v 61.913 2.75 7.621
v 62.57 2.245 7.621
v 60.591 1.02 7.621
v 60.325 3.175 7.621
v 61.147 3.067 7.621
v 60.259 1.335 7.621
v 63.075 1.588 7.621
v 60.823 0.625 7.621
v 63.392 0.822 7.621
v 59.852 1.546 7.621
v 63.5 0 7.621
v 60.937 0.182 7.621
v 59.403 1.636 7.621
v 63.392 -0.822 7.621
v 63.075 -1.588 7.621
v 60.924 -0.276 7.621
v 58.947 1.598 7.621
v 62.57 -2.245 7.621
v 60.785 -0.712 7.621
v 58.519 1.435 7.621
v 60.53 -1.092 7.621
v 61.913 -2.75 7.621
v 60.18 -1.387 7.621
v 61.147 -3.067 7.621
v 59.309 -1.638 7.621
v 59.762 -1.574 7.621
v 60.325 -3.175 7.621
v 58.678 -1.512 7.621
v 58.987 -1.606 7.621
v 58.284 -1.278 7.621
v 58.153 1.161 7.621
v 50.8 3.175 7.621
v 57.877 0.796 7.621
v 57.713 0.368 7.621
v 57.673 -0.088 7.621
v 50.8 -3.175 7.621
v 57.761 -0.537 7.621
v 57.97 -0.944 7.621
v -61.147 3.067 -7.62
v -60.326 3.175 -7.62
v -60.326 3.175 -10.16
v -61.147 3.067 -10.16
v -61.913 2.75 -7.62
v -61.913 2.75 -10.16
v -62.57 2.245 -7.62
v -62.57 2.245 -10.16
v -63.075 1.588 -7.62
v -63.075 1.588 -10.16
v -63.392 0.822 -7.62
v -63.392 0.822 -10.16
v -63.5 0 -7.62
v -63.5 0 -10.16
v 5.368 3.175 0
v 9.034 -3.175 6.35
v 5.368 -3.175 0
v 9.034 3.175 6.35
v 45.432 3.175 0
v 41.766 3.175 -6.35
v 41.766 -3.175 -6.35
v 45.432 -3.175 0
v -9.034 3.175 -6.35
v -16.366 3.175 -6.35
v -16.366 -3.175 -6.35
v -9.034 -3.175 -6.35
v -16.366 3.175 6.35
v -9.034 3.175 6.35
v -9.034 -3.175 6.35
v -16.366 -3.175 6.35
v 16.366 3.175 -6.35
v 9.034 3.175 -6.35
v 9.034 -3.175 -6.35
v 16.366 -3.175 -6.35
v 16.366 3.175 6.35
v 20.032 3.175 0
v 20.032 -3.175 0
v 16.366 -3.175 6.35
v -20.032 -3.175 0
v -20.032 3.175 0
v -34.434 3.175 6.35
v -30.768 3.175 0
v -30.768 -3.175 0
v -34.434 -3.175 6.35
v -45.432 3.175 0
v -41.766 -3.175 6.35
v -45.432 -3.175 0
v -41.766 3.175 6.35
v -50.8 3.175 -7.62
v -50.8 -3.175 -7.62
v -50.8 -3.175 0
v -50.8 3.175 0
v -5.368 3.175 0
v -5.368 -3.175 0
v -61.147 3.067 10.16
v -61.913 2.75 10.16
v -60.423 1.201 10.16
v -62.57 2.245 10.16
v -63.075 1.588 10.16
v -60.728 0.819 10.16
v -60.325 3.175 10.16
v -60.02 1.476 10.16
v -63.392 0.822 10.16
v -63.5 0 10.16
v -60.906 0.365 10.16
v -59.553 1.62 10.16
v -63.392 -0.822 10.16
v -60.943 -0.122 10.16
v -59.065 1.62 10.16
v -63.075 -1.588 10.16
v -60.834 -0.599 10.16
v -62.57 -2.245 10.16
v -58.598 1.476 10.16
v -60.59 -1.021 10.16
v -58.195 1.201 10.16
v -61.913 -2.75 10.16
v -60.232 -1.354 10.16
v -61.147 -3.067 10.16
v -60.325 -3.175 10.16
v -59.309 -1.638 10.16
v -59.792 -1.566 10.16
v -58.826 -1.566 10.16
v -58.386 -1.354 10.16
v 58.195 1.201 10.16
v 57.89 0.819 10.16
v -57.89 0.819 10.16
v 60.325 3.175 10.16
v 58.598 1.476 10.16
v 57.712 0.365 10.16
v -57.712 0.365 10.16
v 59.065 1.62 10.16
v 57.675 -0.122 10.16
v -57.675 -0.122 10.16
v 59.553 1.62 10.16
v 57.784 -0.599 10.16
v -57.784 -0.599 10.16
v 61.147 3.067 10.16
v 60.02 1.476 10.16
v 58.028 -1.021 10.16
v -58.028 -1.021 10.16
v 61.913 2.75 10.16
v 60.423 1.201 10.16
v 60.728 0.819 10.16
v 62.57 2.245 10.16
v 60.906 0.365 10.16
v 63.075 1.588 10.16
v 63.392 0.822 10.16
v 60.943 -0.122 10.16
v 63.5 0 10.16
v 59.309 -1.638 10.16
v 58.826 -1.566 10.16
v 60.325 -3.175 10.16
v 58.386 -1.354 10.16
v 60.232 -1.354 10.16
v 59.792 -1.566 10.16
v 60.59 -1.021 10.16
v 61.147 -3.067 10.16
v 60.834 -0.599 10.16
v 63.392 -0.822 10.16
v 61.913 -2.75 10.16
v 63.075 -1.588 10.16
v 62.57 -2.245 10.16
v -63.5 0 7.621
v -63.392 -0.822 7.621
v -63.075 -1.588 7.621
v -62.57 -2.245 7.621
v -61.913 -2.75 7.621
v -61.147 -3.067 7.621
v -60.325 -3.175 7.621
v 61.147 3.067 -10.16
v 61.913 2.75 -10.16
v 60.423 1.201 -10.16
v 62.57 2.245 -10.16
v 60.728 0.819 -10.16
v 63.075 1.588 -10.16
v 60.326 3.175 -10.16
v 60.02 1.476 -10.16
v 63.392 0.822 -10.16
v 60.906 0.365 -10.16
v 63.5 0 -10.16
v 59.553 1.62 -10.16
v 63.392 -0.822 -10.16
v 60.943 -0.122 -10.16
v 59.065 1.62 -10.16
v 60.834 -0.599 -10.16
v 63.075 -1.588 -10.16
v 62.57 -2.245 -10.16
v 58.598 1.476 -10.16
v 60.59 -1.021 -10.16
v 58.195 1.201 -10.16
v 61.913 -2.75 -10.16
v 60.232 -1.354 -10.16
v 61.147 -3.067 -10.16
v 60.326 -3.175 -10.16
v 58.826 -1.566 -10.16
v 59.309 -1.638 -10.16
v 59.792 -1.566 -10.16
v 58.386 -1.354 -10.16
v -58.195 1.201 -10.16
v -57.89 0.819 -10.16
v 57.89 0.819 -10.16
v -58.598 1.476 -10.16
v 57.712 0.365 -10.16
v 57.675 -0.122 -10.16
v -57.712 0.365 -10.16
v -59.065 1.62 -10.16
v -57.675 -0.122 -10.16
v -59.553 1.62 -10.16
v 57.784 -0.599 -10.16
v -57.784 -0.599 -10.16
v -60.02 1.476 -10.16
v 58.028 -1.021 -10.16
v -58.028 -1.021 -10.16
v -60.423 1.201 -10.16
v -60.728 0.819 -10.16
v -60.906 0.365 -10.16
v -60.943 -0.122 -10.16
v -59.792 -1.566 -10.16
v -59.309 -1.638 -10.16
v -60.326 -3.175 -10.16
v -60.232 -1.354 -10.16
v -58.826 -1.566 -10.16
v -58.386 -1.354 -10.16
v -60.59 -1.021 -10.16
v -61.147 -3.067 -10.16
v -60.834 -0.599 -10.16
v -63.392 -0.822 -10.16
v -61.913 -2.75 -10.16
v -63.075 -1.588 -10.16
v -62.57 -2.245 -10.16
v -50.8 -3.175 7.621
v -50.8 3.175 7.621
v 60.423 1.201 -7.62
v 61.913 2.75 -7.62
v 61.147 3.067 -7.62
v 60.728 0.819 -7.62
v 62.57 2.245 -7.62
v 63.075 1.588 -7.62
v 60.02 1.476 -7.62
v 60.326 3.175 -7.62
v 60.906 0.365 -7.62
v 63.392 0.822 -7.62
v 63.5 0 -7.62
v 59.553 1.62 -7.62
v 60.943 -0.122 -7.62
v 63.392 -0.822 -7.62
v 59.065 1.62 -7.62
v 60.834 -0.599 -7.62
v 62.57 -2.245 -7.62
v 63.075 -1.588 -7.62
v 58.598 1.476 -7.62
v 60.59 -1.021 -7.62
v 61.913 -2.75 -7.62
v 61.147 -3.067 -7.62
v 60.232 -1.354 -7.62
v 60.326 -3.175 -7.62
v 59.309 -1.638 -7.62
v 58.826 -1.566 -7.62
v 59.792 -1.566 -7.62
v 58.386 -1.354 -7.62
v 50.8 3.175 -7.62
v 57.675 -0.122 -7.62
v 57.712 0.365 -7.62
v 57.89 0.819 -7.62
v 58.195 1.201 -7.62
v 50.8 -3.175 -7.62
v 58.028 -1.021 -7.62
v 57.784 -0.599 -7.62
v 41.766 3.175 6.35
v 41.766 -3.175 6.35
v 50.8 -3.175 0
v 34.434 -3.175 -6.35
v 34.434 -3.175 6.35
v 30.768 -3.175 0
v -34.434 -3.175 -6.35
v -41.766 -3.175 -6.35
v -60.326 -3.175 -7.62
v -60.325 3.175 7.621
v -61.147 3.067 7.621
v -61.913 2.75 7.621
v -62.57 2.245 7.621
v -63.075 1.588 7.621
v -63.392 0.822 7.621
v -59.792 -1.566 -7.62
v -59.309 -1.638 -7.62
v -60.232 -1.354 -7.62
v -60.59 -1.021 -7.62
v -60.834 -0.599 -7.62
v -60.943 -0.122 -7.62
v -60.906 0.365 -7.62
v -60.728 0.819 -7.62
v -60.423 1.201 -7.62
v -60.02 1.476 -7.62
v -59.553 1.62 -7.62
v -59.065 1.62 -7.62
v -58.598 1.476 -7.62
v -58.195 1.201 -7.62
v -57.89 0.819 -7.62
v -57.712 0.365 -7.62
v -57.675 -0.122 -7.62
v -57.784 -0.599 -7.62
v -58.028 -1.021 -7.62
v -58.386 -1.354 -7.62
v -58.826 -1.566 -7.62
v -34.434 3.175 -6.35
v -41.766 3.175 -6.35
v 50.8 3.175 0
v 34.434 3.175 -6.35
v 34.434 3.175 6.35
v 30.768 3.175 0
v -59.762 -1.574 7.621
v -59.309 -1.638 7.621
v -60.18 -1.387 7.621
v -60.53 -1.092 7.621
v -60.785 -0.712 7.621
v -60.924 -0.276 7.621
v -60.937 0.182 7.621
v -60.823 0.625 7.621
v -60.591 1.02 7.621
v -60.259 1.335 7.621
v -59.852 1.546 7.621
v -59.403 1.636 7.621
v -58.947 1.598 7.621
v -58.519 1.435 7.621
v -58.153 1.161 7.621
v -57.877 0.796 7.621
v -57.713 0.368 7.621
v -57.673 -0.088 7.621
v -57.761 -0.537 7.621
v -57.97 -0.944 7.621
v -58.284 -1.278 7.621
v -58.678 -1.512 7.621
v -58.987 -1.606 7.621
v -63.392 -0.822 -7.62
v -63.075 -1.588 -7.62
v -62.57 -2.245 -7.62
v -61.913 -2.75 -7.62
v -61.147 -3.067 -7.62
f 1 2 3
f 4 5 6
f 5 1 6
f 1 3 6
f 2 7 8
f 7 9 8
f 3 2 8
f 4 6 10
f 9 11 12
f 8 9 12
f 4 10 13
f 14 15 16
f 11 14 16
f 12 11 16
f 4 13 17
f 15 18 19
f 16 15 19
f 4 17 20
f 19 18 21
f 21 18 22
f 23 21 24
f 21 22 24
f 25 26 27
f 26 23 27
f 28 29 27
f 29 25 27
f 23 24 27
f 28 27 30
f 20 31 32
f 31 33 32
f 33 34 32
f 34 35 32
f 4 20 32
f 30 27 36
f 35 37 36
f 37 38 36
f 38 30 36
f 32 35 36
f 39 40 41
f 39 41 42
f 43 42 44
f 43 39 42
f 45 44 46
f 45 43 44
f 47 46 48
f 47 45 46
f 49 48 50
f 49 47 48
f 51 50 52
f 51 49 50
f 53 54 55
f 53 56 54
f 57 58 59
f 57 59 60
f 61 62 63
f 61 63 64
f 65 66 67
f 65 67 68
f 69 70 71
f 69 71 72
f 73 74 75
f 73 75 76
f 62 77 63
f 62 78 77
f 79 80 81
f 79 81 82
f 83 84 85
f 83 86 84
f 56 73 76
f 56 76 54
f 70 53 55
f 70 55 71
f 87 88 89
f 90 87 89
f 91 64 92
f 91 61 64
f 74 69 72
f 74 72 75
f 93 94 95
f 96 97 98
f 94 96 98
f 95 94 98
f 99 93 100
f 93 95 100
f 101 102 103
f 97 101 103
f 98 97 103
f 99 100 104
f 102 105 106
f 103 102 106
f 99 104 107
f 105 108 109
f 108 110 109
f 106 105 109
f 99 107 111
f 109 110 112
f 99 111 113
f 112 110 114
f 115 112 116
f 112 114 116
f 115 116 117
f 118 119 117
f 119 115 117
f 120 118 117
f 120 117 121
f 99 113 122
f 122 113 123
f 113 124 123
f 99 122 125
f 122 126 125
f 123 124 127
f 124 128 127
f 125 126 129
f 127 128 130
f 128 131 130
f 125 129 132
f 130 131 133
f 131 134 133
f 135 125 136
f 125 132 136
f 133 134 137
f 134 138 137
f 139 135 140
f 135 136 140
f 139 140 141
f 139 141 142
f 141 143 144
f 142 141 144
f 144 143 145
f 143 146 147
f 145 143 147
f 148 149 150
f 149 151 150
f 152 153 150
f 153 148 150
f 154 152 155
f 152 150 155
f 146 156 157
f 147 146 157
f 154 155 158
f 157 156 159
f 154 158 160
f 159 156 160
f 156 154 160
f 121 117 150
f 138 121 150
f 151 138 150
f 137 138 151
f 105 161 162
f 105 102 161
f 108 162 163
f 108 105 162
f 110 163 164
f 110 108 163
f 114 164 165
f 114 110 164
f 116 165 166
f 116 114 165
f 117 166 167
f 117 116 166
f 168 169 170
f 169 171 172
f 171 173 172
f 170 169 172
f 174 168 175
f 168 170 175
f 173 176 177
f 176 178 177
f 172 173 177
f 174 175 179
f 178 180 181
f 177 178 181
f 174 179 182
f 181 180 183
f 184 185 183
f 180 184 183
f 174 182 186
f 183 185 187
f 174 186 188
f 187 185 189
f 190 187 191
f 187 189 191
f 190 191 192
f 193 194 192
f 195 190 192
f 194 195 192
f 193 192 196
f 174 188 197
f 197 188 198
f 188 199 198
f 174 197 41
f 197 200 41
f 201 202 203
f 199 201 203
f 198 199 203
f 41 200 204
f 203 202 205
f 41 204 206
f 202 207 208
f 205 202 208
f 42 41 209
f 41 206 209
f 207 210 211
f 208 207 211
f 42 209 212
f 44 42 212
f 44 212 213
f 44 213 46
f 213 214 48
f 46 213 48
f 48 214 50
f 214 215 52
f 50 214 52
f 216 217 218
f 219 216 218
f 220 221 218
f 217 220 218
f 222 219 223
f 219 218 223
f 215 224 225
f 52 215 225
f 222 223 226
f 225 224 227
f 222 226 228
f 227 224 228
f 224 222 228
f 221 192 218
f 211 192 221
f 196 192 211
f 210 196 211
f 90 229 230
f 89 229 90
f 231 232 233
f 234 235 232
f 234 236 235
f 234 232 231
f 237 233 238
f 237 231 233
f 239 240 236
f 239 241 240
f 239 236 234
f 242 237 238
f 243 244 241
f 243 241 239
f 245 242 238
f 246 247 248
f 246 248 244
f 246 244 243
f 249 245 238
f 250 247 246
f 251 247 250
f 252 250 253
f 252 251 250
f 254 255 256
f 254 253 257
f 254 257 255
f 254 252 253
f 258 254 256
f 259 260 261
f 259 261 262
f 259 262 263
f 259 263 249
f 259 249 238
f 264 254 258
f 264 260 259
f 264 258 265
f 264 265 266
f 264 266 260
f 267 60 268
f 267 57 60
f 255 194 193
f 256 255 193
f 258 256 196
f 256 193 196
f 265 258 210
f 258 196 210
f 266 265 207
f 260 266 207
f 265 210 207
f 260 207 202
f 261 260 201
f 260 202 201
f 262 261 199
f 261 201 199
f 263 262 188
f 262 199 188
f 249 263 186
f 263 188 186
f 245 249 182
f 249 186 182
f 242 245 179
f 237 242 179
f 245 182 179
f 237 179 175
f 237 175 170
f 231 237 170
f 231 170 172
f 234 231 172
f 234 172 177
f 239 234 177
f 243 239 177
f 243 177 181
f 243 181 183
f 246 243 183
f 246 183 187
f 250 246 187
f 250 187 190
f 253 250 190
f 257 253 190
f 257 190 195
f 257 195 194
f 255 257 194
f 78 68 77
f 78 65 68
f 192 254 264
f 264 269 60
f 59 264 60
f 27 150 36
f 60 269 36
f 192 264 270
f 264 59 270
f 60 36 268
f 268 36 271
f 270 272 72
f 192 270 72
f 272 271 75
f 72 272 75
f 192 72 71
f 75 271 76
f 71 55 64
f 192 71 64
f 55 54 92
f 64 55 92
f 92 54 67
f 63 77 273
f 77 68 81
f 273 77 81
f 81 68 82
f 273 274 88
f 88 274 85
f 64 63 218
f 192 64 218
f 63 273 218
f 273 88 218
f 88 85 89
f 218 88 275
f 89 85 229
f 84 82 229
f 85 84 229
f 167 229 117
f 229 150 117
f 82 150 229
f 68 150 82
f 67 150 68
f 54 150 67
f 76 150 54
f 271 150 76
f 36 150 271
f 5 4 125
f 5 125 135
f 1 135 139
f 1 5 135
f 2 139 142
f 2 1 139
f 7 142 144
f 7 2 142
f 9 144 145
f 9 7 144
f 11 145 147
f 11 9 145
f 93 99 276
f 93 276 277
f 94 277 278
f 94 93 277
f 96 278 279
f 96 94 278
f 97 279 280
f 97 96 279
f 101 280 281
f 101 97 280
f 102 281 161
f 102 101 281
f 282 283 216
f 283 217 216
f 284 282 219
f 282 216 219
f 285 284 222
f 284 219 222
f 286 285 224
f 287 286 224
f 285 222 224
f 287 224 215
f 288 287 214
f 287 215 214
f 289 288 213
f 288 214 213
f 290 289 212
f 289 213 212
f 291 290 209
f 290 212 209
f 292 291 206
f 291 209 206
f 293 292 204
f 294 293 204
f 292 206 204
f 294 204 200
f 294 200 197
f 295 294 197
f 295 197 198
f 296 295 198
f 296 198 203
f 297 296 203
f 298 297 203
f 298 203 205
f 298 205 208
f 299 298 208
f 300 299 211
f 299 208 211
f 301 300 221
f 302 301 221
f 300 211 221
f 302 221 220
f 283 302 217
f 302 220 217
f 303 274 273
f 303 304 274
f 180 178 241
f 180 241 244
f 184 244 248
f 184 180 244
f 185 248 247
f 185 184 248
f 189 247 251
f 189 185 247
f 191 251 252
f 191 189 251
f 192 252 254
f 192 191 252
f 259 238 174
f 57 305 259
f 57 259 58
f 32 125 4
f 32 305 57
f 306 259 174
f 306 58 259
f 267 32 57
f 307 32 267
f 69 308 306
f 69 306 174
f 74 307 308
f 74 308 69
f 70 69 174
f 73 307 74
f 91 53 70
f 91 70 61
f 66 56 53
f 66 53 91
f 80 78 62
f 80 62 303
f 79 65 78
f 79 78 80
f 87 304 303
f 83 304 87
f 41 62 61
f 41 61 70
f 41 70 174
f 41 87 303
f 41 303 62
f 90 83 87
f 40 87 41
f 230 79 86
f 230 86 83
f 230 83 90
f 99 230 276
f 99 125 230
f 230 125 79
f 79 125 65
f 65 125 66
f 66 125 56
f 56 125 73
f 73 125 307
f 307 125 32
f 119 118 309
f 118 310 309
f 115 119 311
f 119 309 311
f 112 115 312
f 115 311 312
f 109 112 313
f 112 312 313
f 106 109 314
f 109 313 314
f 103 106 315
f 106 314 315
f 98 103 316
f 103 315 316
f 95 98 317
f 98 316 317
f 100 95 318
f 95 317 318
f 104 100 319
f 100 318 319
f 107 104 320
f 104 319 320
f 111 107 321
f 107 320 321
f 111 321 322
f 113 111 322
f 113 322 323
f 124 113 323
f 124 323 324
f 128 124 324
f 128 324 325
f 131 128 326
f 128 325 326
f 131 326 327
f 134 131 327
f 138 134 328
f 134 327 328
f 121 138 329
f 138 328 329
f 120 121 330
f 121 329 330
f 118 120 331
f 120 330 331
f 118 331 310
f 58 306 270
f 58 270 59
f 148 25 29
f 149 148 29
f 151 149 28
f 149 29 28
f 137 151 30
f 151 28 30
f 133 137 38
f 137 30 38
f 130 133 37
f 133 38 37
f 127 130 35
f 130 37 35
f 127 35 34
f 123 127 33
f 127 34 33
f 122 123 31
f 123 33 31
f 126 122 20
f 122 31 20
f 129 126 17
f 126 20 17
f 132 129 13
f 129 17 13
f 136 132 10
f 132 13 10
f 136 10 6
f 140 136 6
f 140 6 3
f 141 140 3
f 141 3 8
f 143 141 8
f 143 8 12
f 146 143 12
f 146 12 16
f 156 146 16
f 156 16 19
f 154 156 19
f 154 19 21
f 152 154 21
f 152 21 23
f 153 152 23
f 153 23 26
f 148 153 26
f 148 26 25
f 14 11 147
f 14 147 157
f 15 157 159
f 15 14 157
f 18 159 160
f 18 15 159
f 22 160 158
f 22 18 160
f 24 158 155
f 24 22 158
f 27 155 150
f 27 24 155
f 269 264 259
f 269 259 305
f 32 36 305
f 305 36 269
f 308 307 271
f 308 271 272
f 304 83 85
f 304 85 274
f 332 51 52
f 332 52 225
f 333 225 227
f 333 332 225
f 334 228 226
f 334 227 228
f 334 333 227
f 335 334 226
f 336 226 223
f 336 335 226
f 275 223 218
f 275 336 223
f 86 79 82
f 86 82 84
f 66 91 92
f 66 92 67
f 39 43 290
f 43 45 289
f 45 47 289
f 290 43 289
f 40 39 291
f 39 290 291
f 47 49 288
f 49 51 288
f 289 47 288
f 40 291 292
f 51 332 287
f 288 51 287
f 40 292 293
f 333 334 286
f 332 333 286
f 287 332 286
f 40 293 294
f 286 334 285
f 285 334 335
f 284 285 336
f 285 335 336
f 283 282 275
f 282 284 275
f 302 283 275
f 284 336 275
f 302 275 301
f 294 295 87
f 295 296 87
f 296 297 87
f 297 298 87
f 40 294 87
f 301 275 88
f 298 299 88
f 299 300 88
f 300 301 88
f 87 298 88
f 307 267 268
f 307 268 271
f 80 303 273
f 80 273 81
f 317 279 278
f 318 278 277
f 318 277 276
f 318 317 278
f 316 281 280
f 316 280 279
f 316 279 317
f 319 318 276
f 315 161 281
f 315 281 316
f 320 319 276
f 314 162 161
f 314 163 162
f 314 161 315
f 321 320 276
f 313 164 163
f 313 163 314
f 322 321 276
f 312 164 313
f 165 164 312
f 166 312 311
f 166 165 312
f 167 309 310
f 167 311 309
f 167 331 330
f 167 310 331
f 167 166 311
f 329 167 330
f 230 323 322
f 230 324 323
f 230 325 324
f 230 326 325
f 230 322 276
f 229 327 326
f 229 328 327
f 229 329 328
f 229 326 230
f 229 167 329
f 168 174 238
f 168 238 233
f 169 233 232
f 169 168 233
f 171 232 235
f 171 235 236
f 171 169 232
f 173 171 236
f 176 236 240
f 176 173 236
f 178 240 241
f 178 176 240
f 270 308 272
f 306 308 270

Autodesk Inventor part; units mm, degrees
ref_plane "YZ Plane" through (0, 0, 0) normal (1, 0, 0) x (0, 1, 0)
ref_plane "XZ Plane" through (0, 0, 0) normal (0, 1, 0) x (-1, 0, 0)
ref_plane "XY Plane" through (0, 0, 0) normal (0, 0, 1) x (1, 0, 0)
sketch "Sketch1" plane through (0, 0, 0) normal (0, 1, 0) x (-1, 0, 0)
  line L0 (63.4999, 10.16) -> (-63.4999, 10.16)
  line L1 (-63.5, -10.16) -> (63.5, -10.16)
  line L2 (63.4999, 10.16) -> (-63.5, -10.16) construction
  line L3 (-63.4999, 10.16) -> (63.5, -10.16) construction
  line L4 (-63.5, -7.62) -> (-50.8, -7.62)
  line L5 (-50.8, -7.62) -> (-50.8, 0)
  line L6 (0, 0) -> (-63.5, 0.0004) construction
  line L7 (0, 0) -> (0, -10.16) construction
  line L8 (-63.4999, 7.6208) -> (-50.7999, 7.6206)
  line L9 (-50.7999, 7.6206) -> (-50.8, 0)
  line L10 (63.5, -7.62) -> (50.8, -7.62)
  line L11 (50.8, -7.62) -> (50.8, 0)
  line L12 (63.4999, 7.6208) -> (50.7999, 7.6206)
  line L13 (50.7999, 7.6206) -> (50.8, 0)
  line L14 (63.5, -10.16) -> (63.5, -7.62)
  line L15 (63.4999, 7.6208) -> (63.4999, 10.16)
  line L16 (-63.4999, 10.16) -> (-63.4999, 7.6208)
  line L17 (-63.5, -7.62) -> (-63.5, -10.16)
  dimension "length" = 127
  dimension "oneHalfCutoffWidth" = 7.62
  dimension "cutoutWidth" = 12.7
  dimension "width" = 20.32
extrude "Extrusion1" add sketch "Sketch1" along normal mid plane 6.35
sketch "Sketch2" plane through (-63.4999, 3.175, 10.16) normal (0, 0, 1) x (1, 0, 0)
  line L0 (63.4999, -3.175) -> (63.4999, 0) construction
  line L1 (0, 0) -> (126.9998, 0) construction
  point P0 (122.8089, -3.175)
  point P1 (4.1909, -3.175)
  dimension "d8" = 59.309
hole "Hole1" at (59.309, 0, 10.16) at (-59.309, 0, 10.16) direction (0, 0, -1) diameter 3.2766 end through all clearance for "Flat Head Machine Screw (82)" size "#4" standard "Ansi Unified Screw Threads"
fillet "Fillet2" radius 3.175 8 edges at (63.5, 3.175, -8.89) (63.5, -3.175, -8.89) (63.4999, 3.175, 8.8904) (63.4999, -3.175, 8.8904) (-63.4999, 3.175, 8.8904) (-63.4999, -3.175, 8.8904) (-63.5, 3.175, -8.89) (-63.5, -3.175, -8.89)
sketch "Sketch5" plane through (0, 3.175, 0) normal (0, 1, 0) x (1, 0, 0)
  line L0 (-50.8, 0) -> (50.8, 0) construction
  line L1 (-34.4338, 6.35) -> (-30.7677, 0)
  line L2 (-30.7677, 0) -> (-34.4338, -6.35)
  line L3 (-34.4338, -6.35) -> (-41.7662, -6.35)
  line L4 (-41.7662, -6.35) -> (-45.4323, 0)
  line L5 (-45.4323, 0) -> (-41.7662, 6.35)
  line L6 (-41.7662, 6.35) -> (-34.4338, 6.35)
  line L7 (-50.8, 0) -> (-50.7999, -7.6206) projected
  line L8 (-16.3662, 6.35) -> (-9.0338, 6.35)
  line L9 (-9.0338, 6.35) -> (-5.3677, 0)
  line L10 (-5.3677, 0) -> (-9.0338, -6.35)
  line L11 (-9.0338, -6.35) -> (-16.3662, -6.35)
  line L12 (-16.3662, -6.35) -> (-20.0323, 0)
  line L13 (-20.0323, 0) -> (-16.3662, 6.35)
  line L14 (9.0338, 6.35) -> (16.3662, 6.35)
  line L15 (16.3662, 6.35) -> (20.0323, 0)
  line L16 (20.0323, 0) -> (16.3662, -6.35)
  line L17 (16.3662, -6.35) -> (9.0338, -6.35)
  line L18 (9.0338, -6.35) -> (5.3677, 0)
  line L19 (5.3677, 0) -> (9.0338, 6.35)
  line L20 (34.4338, 6.35) -> (41.7662, 6.35)
  line L21 (41.7662, 6.35) -> (45.4323, 0)
  line L22 (45.4323, 0) -> (41.7662, -6.35)
  line L23 (41.7662, -6.35) -> (34.4338, -6.35)
  line L24 (34.4338, -6.35) -> (30.7677, 0)
  line L25 (30.7677, 0) -> (34.4338, 6.35)
  point P0 (0, 0)
  point P1 (-38.1, 0)
  dimension "d18" = 12.7
  dimension "d19" = 12.7
  dimension "d22" = 25.4
extrude "Extrusion2" cut sketch "Sketch5" against normal through all
equation "\"endFilet\" = 0.5 * depth"
equation "\"depth\" = 6.35"
properties part number "supportPiece"
